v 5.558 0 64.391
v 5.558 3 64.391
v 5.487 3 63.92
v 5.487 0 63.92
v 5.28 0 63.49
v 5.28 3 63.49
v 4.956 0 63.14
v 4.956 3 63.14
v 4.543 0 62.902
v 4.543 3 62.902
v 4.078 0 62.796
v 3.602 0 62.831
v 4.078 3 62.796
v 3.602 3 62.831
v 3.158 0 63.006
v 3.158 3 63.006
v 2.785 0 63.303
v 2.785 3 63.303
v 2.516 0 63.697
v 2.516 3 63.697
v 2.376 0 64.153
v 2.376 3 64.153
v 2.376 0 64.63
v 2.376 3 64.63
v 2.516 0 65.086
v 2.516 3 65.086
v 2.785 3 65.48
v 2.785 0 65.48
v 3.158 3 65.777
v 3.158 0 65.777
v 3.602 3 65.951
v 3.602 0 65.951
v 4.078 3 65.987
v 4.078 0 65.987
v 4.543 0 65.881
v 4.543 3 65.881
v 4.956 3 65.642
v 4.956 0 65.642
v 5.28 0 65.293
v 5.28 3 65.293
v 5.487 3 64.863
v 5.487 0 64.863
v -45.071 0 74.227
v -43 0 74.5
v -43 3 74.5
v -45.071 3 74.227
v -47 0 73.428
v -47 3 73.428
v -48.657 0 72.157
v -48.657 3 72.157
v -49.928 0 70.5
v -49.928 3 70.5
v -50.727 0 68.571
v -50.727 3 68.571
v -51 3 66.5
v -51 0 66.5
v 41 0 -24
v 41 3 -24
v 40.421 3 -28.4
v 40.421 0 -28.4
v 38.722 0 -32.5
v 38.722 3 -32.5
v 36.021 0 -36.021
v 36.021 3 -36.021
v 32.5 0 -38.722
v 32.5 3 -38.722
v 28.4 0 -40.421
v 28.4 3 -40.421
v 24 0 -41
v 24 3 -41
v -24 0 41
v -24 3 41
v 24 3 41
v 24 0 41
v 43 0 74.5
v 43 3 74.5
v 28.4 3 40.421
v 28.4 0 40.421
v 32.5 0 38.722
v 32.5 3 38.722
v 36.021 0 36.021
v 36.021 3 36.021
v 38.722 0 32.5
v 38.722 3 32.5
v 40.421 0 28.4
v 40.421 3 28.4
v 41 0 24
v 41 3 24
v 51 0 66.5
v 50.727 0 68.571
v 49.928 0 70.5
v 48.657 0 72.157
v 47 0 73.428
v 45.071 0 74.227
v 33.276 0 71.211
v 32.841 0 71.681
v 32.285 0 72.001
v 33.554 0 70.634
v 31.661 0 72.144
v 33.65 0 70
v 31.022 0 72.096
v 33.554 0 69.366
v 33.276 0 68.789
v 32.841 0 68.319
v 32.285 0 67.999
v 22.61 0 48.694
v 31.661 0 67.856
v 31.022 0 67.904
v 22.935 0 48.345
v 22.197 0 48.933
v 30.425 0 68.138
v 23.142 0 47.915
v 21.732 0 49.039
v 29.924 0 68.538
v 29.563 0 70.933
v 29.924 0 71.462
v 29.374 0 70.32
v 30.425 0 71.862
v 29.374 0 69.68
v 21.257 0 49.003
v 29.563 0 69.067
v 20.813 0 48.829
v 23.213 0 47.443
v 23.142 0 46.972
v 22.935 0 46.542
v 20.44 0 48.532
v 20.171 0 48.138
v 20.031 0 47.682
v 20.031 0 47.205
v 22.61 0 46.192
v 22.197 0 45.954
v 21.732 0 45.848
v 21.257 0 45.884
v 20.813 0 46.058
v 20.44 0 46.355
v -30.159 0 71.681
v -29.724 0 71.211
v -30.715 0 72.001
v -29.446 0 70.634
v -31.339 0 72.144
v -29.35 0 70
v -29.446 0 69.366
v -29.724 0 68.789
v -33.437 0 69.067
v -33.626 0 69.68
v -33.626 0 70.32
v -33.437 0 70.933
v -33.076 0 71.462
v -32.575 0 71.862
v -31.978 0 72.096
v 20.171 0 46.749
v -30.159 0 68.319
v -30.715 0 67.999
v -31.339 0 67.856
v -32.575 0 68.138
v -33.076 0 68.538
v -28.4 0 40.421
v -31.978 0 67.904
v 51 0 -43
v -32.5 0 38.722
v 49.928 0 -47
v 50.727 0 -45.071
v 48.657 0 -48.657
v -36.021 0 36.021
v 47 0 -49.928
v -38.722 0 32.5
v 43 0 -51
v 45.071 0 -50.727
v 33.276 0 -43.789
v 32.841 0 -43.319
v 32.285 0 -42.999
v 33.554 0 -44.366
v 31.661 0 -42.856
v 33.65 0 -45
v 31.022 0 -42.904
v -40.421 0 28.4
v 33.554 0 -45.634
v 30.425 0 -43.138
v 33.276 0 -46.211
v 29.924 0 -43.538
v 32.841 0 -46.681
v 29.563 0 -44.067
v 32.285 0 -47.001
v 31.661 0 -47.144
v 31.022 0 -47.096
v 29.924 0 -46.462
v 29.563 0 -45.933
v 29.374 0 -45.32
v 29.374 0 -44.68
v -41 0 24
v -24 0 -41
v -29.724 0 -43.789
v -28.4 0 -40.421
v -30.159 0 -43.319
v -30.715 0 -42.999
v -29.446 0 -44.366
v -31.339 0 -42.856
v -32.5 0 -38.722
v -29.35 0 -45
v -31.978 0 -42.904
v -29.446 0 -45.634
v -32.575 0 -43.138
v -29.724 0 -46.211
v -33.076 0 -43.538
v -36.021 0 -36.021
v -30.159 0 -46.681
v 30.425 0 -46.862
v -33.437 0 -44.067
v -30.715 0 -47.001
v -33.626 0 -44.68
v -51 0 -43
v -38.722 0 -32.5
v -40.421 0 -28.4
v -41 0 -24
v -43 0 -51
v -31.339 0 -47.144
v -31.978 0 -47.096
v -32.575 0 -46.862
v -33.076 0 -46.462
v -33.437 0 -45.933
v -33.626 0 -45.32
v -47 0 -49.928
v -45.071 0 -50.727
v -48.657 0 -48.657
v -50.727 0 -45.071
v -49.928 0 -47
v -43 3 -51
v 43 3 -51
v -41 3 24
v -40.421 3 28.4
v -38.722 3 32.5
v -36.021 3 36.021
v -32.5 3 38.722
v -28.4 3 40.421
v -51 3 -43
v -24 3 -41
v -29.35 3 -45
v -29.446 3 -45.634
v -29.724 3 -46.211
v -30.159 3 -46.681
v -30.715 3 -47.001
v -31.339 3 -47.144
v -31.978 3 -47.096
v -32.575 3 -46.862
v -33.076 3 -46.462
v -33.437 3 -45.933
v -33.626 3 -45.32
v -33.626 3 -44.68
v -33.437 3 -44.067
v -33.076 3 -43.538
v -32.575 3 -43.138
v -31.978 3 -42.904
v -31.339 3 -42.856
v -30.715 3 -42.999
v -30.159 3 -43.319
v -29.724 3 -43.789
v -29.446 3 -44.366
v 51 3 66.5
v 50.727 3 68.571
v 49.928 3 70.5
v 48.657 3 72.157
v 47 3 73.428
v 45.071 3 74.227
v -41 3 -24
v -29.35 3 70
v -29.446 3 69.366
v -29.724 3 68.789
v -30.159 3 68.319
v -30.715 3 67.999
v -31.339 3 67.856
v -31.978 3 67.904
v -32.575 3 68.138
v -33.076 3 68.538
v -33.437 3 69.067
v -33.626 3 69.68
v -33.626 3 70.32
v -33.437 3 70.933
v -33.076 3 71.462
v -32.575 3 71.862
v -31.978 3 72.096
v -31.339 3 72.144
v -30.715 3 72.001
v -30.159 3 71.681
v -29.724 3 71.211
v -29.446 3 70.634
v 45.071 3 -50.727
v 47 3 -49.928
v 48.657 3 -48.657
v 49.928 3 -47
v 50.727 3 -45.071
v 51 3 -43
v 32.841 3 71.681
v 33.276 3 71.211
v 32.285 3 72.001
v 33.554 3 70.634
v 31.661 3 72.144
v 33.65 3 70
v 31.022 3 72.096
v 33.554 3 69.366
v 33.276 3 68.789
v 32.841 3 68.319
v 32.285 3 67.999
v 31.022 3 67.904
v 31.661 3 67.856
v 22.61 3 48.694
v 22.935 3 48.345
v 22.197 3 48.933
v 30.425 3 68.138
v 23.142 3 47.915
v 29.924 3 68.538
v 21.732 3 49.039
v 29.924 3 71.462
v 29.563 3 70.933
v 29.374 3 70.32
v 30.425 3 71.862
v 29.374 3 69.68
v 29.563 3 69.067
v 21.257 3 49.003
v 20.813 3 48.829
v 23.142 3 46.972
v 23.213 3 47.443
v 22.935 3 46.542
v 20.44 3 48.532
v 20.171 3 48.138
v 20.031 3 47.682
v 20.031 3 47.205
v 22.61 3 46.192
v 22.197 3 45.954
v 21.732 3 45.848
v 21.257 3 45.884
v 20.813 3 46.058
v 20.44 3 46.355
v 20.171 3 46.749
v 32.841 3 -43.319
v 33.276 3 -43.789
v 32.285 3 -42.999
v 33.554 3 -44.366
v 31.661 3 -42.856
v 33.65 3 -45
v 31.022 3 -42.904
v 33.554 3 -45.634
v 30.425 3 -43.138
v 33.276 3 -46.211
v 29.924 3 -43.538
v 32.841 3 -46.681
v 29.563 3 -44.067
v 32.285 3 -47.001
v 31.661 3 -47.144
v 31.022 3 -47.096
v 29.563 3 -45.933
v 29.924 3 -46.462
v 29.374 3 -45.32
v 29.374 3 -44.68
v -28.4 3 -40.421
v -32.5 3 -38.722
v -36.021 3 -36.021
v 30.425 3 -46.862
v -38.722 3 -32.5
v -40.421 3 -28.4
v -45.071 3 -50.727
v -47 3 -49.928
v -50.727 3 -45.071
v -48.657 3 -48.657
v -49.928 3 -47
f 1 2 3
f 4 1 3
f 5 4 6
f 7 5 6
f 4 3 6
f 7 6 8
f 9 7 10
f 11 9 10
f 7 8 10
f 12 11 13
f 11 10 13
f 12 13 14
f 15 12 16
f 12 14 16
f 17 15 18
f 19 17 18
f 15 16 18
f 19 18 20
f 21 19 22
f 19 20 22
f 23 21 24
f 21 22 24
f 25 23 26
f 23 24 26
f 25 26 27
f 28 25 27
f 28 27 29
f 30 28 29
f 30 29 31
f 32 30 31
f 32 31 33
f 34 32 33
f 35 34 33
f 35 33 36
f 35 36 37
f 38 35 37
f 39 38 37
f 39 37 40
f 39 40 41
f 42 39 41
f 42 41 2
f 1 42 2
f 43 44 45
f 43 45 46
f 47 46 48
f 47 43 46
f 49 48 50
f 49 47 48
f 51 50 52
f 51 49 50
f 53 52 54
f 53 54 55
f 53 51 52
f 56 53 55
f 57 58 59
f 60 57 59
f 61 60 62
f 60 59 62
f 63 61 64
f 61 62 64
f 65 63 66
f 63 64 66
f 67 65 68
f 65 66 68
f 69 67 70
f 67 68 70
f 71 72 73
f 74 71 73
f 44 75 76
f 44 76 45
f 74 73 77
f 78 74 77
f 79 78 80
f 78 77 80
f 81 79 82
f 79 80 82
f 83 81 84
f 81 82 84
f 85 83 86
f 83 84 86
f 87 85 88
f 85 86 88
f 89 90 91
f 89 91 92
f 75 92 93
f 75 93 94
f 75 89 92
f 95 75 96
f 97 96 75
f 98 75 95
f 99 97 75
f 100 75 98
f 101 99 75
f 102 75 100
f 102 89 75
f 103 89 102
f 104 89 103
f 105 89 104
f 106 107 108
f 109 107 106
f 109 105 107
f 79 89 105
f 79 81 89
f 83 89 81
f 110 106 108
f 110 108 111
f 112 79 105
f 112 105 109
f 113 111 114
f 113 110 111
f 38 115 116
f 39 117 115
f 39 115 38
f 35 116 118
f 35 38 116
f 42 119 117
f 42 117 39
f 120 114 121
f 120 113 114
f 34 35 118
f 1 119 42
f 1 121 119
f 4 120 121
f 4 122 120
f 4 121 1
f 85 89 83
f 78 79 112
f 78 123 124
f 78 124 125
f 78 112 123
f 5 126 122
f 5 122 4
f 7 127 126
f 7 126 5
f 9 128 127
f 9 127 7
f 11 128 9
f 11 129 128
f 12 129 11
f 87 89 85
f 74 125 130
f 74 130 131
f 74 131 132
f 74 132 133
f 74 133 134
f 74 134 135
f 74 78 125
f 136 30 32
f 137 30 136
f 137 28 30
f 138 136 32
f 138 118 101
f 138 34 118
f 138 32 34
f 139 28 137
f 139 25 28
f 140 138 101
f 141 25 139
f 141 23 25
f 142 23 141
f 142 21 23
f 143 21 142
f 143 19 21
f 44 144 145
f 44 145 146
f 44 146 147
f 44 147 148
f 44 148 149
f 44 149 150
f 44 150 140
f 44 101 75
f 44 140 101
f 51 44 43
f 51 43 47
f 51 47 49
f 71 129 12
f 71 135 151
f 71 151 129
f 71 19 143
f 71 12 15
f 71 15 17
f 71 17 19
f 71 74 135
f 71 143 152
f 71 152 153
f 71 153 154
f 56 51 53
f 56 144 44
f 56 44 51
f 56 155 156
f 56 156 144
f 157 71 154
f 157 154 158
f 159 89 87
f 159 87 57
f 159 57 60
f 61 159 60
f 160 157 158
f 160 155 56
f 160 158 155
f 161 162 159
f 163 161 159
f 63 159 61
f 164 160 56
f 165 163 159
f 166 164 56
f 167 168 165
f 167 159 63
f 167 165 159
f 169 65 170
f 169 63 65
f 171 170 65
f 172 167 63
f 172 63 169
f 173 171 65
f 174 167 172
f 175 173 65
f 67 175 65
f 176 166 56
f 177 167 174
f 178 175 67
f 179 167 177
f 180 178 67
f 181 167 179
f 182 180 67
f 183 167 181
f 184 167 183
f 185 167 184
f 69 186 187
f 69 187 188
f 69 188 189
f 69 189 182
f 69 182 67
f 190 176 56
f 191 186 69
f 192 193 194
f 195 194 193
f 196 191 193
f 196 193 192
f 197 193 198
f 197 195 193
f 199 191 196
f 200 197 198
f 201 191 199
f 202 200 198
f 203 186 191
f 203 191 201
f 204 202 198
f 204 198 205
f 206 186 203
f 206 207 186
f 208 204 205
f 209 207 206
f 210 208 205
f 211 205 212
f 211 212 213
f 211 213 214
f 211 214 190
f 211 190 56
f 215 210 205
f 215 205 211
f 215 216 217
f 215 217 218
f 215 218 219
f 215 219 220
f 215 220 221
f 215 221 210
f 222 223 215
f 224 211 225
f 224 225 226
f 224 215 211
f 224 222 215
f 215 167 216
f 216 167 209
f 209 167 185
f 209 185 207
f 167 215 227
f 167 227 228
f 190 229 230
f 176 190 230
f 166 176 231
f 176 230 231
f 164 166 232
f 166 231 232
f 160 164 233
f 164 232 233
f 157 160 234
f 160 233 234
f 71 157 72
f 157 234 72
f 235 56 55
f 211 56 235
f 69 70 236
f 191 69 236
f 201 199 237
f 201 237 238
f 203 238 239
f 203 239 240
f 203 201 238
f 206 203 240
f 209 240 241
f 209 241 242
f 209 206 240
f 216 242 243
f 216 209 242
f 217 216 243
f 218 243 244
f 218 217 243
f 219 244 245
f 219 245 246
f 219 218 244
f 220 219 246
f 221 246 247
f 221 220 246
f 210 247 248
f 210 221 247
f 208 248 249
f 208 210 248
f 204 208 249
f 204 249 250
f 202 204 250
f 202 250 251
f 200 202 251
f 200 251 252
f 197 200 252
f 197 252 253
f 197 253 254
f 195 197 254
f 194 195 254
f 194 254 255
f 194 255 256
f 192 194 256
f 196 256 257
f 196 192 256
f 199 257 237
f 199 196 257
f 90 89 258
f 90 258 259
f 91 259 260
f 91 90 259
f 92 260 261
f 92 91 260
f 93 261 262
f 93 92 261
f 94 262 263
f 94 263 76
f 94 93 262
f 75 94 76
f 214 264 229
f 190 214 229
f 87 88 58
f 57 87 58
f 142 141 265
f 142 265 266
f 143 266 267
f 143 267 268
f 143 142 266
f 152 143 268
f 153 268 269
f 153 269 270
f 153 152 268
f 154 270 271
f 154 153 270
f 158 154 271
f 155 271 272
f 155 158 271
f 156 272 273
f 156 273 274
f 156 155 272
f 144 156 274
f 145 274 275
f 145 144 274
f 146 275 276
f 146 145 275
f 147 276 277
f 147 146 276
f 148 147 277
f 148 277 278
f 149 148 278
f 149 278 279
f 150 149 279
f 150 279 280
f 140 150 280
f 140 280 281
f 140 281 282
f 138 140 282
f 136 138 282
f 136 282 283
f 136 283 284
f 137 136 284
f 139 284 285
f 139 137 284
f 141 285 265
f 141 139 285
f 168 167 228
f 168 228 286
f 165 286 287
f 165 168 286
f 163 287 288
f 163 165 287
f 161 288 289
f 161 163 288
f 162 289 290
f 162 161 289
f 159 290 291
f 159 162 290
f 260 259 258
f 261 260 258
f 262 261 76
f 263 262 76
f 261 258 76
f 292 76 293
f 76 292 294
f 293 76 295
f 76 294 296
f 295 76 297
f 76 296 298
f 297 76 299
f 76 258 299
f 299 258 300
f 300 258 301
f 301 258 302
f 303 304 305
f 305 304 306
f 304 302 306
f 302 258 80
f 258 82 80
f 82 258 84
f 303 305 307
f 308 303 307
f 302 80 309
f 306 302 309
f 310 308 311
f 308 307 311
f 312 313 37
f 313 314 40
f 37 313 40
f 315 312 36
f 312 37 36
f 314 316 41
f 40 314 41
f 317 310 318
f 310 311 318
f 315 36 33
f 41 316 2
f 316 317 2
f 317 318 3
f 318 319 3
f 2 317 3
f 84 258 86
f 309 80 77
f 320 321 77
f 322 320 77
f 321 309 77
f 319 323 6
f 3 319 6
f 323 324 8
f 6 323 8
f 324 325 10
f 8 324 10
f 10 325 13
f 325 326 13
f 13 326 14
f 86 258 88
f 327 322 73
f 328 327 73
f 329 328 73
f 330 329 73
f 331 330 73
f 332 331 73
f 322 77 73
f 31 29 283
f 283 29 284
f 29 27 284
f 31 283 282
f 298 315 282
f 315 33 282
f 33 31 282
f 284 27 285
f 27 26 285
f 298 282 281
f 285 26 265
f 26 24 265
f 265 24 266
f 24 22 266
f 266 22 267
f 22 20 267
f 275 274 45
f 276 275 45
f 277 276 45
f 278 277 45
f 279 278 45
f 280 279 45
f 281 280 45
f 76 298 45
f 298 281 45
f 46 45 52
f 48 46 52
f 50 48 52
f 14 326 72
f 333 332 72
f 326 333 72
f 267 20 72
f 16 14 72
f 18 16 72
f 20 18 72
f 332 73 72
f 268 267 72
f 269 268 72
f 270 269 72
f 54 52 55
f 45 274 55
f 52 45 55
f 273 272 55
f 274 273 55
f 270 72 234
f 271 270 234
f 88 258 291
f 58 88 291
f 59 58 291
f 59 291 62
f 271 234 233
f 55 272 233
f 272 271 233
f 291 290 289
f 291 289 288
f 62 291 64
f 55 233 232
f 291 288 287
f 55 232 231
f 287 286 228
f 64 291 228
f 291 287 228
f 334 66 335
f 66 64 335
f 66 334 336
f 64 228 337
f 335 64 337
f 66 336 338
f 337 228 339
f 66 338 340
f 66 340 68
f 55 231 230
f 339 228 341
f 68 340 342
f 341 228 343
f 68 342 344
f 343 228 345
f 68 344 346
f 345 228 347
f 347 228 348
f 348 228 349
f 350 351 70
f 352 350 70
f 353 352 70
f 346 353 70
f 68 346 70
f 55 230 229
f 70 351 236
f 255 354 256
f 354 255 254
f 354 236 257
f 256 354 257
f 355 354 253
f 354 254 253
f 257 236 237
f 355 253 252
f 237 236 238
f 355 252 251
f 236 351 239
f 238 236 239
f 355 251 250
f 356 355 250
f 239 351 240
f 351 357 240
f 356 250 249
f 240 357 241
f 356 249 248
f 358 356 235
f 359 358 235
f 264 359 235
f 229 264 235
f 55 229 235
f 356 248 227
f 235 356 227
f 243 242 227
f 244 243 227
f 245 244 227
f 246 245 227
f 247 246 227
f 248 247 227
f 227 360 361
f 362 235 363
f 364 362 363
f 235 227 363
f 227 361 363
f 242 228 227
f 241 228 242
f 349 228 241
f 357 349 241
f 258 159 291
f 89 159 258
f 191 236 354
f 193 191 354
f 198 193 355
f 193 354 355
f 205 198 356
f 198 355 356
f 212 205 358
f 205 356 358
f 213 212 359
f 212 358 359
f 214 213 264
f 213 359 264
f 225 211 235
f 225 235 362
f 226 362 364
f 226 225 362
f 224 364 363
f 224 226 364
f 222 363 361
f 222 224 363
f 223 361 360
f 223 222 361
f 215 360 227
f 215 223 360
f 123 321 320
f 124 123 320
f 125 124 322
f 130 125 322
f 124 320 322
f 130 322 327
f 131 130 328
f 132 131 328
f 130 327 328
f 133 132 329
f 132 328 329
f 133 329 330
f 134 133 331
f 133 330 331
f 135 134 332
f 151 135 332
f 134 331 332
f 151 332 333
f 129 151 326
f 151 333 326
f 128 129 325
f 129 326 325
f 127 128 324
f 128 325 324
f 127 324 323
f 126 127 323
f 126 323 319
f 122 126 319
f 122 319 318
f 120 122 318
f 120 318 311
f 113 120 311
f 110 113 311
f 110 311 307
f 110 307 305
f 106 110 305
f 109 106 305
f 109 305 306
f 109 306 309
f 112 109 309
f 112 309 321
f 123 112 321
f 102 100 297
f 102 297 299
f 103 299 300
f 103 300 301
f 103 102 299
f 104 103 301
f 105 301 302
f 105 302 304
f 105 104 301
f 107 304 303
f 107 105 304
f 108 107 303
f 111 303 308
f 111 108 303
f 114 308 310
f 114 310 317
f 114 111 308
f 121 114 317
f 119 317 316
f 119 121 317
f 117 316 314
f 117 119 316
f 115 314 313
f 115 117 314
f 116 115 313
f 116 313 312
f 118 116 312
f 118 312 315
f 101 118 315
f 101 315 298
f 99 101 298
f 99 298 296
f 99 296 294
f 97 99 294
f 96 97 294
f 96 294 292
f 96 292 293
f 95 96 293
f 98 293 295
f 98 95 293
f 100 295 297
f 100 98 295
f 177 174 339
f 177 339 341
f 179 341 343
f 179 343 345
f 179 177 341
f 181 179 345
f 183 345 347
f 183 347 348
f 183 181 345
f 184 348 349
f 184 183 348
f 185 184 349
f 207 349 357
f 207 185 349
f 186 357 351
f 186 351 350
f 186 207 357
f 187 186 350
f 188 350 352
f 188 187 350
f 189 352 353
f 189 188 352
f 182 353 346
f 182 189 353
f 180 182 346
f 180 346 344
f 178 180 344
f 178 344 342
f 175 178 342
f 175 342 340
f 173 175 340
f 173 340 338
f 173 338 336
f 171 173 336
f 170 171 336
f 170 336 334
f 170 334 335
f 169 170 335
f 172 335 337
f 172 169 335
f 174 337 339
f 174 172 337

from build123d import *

# Parameters (mm, degrees)
SKETCH1_R           = 2.15
BOSS_EXTRUDE1_DEPTH = 3
CUT_EXTRUDE1_REACH  = 5
CUT_EXTRUDE2_REACH  = 5
SKETCH5_R           = 1.6


with BuildPart() as part:
    # Sketch1 → Boss-Extrude1 (new body)
    with BuildSketch(Plane(origin=(0, 0, 0), x_dir=(1, 0, 0), z_dir=(0, 1, 0))):
        with BuildLine():
            Line((-43, 51), (43, 51))
            ThreePointArc((43, 51), (48.656854249, 48.656854249), (51, 43))
            Line((51, 43), (51, -66.5))
            ThreePointArc((51, -66.5), (48.656854249, -72.156854249), (43, -74.5))
            Line((43, -74.5), (-43, -74.5))
            ThreePointArc((-43, -74.5), (-48.656854249, -72.156854249), (-51, -66.5))
            Line((-51, -66.5), (-51, 43))
            ThreePointArc((-51, 43), (-48.656854249, 48.656854249), (-43, 51))
        make_face()
        with Locations((-31.5, 45)):
            Circle(SKETCH1_R, mode=Mode.SUBTRACT)
        with Locations((31.5, 45)):
            Circle(SKETCH1_R, mode=Mode.SUBTRACT)
        with Locations((-31.5, -70)):
            Circle(SKETCH1_R, mode=Mode.SUBTRACT)
        with Locations((31.5, -70)):
            Circle(SKETCH1_R, mode=Mode.SUBTRACT)
    extrude(amount=BOSS_EXTRUDE1_DEPTH)

    # Sketch3 → Cut-Extrude1 (cut, up to next)
    with BuildSketch(Plane(origin=(0, 3, 0), x_dir=(1, 0, 0), z_dir=(0, 1, 0)), mode=Mode.PRIVATE) as cut_extrude1_sk1:
        with BuildLine():
            Line((-24, -41), (24, -41))
            ThreePointArc((24, -41), (36.02081528, -36.02081528), (41, -24))
            Line((41, -24), (41, 24))
            ThreePointArc((41, 24), (36.02081528, 36.02081528), (24, 41))
            Line((24, 41), (-24, 41))
            ThreePointArc((-24, 41), (-36.02081528, 36.02081528), (-41, 24))
            Line((-41, 24), (-41, -24))
            ThreePointArc((-41, -24), (-36.02081528, -36.02081528), (-24, -41))
        make_face()
    cut_extrude1_tool1 = extrude(cut_extrude1_sk1.sketch, amount=-CUT_EXTRUDE1_REACH, mode=Mode.PRIVATE) & part.part
    add(cut_extrude1_tool1.solids().sort_by_distance((0, 3, 0))[0], mode=Mode.SUBTRACT)

    # Sketch5 → Cut-Extrude2 (cut, up to next)
    with BuildSketch(Plane(origin=(0, 3, 0), x_dir=(1, 0, 0), z_dir=(0, 1, 0)), mode=Mode.PRIVATE) as cut_extrude2_sk1:
        with Locations((21.612877951, -47.443396553)):
            Circle(SKETCH5_R)
    cut_extrude2_tool1 = extrude(cut_extrude2_sk1.sketch, amount=-CUT_EXTRUDE2_REACH, mode=Mode.PRIVATE) & part.part
    add(cut_extrude2_tool1.solids().sort_by_distance((21.612878, 3, 47.443397))[0], mode=Mode.SUBTRACT)
    # Sketch5 → Cut-Extrude2 (cut, up to next)
    with BuildSketch(Plane(origin=(0, 3, 0), x_dir=(1, 0, 0), z_dir=(0, 1, 0)), mode=Mode.PRIVATE) as cut_extrude2_sk2:
        with Locations((3.957960008, -64.39137202)):
            Circle(SKETCH5_R)
    cut_extrude2_tool2 = extrude(cut_extrude2_sk2.sketch, amount=-CUT_EXTRUDE2_REACH, mode=Mode.PRIVATE) & part.part
    add(cut_extrude2_tool2.solids().sort_by_distance((3.95796, 3, 64.391372))[0], mode=Mode.SUBTRACT)


solid = part.part
